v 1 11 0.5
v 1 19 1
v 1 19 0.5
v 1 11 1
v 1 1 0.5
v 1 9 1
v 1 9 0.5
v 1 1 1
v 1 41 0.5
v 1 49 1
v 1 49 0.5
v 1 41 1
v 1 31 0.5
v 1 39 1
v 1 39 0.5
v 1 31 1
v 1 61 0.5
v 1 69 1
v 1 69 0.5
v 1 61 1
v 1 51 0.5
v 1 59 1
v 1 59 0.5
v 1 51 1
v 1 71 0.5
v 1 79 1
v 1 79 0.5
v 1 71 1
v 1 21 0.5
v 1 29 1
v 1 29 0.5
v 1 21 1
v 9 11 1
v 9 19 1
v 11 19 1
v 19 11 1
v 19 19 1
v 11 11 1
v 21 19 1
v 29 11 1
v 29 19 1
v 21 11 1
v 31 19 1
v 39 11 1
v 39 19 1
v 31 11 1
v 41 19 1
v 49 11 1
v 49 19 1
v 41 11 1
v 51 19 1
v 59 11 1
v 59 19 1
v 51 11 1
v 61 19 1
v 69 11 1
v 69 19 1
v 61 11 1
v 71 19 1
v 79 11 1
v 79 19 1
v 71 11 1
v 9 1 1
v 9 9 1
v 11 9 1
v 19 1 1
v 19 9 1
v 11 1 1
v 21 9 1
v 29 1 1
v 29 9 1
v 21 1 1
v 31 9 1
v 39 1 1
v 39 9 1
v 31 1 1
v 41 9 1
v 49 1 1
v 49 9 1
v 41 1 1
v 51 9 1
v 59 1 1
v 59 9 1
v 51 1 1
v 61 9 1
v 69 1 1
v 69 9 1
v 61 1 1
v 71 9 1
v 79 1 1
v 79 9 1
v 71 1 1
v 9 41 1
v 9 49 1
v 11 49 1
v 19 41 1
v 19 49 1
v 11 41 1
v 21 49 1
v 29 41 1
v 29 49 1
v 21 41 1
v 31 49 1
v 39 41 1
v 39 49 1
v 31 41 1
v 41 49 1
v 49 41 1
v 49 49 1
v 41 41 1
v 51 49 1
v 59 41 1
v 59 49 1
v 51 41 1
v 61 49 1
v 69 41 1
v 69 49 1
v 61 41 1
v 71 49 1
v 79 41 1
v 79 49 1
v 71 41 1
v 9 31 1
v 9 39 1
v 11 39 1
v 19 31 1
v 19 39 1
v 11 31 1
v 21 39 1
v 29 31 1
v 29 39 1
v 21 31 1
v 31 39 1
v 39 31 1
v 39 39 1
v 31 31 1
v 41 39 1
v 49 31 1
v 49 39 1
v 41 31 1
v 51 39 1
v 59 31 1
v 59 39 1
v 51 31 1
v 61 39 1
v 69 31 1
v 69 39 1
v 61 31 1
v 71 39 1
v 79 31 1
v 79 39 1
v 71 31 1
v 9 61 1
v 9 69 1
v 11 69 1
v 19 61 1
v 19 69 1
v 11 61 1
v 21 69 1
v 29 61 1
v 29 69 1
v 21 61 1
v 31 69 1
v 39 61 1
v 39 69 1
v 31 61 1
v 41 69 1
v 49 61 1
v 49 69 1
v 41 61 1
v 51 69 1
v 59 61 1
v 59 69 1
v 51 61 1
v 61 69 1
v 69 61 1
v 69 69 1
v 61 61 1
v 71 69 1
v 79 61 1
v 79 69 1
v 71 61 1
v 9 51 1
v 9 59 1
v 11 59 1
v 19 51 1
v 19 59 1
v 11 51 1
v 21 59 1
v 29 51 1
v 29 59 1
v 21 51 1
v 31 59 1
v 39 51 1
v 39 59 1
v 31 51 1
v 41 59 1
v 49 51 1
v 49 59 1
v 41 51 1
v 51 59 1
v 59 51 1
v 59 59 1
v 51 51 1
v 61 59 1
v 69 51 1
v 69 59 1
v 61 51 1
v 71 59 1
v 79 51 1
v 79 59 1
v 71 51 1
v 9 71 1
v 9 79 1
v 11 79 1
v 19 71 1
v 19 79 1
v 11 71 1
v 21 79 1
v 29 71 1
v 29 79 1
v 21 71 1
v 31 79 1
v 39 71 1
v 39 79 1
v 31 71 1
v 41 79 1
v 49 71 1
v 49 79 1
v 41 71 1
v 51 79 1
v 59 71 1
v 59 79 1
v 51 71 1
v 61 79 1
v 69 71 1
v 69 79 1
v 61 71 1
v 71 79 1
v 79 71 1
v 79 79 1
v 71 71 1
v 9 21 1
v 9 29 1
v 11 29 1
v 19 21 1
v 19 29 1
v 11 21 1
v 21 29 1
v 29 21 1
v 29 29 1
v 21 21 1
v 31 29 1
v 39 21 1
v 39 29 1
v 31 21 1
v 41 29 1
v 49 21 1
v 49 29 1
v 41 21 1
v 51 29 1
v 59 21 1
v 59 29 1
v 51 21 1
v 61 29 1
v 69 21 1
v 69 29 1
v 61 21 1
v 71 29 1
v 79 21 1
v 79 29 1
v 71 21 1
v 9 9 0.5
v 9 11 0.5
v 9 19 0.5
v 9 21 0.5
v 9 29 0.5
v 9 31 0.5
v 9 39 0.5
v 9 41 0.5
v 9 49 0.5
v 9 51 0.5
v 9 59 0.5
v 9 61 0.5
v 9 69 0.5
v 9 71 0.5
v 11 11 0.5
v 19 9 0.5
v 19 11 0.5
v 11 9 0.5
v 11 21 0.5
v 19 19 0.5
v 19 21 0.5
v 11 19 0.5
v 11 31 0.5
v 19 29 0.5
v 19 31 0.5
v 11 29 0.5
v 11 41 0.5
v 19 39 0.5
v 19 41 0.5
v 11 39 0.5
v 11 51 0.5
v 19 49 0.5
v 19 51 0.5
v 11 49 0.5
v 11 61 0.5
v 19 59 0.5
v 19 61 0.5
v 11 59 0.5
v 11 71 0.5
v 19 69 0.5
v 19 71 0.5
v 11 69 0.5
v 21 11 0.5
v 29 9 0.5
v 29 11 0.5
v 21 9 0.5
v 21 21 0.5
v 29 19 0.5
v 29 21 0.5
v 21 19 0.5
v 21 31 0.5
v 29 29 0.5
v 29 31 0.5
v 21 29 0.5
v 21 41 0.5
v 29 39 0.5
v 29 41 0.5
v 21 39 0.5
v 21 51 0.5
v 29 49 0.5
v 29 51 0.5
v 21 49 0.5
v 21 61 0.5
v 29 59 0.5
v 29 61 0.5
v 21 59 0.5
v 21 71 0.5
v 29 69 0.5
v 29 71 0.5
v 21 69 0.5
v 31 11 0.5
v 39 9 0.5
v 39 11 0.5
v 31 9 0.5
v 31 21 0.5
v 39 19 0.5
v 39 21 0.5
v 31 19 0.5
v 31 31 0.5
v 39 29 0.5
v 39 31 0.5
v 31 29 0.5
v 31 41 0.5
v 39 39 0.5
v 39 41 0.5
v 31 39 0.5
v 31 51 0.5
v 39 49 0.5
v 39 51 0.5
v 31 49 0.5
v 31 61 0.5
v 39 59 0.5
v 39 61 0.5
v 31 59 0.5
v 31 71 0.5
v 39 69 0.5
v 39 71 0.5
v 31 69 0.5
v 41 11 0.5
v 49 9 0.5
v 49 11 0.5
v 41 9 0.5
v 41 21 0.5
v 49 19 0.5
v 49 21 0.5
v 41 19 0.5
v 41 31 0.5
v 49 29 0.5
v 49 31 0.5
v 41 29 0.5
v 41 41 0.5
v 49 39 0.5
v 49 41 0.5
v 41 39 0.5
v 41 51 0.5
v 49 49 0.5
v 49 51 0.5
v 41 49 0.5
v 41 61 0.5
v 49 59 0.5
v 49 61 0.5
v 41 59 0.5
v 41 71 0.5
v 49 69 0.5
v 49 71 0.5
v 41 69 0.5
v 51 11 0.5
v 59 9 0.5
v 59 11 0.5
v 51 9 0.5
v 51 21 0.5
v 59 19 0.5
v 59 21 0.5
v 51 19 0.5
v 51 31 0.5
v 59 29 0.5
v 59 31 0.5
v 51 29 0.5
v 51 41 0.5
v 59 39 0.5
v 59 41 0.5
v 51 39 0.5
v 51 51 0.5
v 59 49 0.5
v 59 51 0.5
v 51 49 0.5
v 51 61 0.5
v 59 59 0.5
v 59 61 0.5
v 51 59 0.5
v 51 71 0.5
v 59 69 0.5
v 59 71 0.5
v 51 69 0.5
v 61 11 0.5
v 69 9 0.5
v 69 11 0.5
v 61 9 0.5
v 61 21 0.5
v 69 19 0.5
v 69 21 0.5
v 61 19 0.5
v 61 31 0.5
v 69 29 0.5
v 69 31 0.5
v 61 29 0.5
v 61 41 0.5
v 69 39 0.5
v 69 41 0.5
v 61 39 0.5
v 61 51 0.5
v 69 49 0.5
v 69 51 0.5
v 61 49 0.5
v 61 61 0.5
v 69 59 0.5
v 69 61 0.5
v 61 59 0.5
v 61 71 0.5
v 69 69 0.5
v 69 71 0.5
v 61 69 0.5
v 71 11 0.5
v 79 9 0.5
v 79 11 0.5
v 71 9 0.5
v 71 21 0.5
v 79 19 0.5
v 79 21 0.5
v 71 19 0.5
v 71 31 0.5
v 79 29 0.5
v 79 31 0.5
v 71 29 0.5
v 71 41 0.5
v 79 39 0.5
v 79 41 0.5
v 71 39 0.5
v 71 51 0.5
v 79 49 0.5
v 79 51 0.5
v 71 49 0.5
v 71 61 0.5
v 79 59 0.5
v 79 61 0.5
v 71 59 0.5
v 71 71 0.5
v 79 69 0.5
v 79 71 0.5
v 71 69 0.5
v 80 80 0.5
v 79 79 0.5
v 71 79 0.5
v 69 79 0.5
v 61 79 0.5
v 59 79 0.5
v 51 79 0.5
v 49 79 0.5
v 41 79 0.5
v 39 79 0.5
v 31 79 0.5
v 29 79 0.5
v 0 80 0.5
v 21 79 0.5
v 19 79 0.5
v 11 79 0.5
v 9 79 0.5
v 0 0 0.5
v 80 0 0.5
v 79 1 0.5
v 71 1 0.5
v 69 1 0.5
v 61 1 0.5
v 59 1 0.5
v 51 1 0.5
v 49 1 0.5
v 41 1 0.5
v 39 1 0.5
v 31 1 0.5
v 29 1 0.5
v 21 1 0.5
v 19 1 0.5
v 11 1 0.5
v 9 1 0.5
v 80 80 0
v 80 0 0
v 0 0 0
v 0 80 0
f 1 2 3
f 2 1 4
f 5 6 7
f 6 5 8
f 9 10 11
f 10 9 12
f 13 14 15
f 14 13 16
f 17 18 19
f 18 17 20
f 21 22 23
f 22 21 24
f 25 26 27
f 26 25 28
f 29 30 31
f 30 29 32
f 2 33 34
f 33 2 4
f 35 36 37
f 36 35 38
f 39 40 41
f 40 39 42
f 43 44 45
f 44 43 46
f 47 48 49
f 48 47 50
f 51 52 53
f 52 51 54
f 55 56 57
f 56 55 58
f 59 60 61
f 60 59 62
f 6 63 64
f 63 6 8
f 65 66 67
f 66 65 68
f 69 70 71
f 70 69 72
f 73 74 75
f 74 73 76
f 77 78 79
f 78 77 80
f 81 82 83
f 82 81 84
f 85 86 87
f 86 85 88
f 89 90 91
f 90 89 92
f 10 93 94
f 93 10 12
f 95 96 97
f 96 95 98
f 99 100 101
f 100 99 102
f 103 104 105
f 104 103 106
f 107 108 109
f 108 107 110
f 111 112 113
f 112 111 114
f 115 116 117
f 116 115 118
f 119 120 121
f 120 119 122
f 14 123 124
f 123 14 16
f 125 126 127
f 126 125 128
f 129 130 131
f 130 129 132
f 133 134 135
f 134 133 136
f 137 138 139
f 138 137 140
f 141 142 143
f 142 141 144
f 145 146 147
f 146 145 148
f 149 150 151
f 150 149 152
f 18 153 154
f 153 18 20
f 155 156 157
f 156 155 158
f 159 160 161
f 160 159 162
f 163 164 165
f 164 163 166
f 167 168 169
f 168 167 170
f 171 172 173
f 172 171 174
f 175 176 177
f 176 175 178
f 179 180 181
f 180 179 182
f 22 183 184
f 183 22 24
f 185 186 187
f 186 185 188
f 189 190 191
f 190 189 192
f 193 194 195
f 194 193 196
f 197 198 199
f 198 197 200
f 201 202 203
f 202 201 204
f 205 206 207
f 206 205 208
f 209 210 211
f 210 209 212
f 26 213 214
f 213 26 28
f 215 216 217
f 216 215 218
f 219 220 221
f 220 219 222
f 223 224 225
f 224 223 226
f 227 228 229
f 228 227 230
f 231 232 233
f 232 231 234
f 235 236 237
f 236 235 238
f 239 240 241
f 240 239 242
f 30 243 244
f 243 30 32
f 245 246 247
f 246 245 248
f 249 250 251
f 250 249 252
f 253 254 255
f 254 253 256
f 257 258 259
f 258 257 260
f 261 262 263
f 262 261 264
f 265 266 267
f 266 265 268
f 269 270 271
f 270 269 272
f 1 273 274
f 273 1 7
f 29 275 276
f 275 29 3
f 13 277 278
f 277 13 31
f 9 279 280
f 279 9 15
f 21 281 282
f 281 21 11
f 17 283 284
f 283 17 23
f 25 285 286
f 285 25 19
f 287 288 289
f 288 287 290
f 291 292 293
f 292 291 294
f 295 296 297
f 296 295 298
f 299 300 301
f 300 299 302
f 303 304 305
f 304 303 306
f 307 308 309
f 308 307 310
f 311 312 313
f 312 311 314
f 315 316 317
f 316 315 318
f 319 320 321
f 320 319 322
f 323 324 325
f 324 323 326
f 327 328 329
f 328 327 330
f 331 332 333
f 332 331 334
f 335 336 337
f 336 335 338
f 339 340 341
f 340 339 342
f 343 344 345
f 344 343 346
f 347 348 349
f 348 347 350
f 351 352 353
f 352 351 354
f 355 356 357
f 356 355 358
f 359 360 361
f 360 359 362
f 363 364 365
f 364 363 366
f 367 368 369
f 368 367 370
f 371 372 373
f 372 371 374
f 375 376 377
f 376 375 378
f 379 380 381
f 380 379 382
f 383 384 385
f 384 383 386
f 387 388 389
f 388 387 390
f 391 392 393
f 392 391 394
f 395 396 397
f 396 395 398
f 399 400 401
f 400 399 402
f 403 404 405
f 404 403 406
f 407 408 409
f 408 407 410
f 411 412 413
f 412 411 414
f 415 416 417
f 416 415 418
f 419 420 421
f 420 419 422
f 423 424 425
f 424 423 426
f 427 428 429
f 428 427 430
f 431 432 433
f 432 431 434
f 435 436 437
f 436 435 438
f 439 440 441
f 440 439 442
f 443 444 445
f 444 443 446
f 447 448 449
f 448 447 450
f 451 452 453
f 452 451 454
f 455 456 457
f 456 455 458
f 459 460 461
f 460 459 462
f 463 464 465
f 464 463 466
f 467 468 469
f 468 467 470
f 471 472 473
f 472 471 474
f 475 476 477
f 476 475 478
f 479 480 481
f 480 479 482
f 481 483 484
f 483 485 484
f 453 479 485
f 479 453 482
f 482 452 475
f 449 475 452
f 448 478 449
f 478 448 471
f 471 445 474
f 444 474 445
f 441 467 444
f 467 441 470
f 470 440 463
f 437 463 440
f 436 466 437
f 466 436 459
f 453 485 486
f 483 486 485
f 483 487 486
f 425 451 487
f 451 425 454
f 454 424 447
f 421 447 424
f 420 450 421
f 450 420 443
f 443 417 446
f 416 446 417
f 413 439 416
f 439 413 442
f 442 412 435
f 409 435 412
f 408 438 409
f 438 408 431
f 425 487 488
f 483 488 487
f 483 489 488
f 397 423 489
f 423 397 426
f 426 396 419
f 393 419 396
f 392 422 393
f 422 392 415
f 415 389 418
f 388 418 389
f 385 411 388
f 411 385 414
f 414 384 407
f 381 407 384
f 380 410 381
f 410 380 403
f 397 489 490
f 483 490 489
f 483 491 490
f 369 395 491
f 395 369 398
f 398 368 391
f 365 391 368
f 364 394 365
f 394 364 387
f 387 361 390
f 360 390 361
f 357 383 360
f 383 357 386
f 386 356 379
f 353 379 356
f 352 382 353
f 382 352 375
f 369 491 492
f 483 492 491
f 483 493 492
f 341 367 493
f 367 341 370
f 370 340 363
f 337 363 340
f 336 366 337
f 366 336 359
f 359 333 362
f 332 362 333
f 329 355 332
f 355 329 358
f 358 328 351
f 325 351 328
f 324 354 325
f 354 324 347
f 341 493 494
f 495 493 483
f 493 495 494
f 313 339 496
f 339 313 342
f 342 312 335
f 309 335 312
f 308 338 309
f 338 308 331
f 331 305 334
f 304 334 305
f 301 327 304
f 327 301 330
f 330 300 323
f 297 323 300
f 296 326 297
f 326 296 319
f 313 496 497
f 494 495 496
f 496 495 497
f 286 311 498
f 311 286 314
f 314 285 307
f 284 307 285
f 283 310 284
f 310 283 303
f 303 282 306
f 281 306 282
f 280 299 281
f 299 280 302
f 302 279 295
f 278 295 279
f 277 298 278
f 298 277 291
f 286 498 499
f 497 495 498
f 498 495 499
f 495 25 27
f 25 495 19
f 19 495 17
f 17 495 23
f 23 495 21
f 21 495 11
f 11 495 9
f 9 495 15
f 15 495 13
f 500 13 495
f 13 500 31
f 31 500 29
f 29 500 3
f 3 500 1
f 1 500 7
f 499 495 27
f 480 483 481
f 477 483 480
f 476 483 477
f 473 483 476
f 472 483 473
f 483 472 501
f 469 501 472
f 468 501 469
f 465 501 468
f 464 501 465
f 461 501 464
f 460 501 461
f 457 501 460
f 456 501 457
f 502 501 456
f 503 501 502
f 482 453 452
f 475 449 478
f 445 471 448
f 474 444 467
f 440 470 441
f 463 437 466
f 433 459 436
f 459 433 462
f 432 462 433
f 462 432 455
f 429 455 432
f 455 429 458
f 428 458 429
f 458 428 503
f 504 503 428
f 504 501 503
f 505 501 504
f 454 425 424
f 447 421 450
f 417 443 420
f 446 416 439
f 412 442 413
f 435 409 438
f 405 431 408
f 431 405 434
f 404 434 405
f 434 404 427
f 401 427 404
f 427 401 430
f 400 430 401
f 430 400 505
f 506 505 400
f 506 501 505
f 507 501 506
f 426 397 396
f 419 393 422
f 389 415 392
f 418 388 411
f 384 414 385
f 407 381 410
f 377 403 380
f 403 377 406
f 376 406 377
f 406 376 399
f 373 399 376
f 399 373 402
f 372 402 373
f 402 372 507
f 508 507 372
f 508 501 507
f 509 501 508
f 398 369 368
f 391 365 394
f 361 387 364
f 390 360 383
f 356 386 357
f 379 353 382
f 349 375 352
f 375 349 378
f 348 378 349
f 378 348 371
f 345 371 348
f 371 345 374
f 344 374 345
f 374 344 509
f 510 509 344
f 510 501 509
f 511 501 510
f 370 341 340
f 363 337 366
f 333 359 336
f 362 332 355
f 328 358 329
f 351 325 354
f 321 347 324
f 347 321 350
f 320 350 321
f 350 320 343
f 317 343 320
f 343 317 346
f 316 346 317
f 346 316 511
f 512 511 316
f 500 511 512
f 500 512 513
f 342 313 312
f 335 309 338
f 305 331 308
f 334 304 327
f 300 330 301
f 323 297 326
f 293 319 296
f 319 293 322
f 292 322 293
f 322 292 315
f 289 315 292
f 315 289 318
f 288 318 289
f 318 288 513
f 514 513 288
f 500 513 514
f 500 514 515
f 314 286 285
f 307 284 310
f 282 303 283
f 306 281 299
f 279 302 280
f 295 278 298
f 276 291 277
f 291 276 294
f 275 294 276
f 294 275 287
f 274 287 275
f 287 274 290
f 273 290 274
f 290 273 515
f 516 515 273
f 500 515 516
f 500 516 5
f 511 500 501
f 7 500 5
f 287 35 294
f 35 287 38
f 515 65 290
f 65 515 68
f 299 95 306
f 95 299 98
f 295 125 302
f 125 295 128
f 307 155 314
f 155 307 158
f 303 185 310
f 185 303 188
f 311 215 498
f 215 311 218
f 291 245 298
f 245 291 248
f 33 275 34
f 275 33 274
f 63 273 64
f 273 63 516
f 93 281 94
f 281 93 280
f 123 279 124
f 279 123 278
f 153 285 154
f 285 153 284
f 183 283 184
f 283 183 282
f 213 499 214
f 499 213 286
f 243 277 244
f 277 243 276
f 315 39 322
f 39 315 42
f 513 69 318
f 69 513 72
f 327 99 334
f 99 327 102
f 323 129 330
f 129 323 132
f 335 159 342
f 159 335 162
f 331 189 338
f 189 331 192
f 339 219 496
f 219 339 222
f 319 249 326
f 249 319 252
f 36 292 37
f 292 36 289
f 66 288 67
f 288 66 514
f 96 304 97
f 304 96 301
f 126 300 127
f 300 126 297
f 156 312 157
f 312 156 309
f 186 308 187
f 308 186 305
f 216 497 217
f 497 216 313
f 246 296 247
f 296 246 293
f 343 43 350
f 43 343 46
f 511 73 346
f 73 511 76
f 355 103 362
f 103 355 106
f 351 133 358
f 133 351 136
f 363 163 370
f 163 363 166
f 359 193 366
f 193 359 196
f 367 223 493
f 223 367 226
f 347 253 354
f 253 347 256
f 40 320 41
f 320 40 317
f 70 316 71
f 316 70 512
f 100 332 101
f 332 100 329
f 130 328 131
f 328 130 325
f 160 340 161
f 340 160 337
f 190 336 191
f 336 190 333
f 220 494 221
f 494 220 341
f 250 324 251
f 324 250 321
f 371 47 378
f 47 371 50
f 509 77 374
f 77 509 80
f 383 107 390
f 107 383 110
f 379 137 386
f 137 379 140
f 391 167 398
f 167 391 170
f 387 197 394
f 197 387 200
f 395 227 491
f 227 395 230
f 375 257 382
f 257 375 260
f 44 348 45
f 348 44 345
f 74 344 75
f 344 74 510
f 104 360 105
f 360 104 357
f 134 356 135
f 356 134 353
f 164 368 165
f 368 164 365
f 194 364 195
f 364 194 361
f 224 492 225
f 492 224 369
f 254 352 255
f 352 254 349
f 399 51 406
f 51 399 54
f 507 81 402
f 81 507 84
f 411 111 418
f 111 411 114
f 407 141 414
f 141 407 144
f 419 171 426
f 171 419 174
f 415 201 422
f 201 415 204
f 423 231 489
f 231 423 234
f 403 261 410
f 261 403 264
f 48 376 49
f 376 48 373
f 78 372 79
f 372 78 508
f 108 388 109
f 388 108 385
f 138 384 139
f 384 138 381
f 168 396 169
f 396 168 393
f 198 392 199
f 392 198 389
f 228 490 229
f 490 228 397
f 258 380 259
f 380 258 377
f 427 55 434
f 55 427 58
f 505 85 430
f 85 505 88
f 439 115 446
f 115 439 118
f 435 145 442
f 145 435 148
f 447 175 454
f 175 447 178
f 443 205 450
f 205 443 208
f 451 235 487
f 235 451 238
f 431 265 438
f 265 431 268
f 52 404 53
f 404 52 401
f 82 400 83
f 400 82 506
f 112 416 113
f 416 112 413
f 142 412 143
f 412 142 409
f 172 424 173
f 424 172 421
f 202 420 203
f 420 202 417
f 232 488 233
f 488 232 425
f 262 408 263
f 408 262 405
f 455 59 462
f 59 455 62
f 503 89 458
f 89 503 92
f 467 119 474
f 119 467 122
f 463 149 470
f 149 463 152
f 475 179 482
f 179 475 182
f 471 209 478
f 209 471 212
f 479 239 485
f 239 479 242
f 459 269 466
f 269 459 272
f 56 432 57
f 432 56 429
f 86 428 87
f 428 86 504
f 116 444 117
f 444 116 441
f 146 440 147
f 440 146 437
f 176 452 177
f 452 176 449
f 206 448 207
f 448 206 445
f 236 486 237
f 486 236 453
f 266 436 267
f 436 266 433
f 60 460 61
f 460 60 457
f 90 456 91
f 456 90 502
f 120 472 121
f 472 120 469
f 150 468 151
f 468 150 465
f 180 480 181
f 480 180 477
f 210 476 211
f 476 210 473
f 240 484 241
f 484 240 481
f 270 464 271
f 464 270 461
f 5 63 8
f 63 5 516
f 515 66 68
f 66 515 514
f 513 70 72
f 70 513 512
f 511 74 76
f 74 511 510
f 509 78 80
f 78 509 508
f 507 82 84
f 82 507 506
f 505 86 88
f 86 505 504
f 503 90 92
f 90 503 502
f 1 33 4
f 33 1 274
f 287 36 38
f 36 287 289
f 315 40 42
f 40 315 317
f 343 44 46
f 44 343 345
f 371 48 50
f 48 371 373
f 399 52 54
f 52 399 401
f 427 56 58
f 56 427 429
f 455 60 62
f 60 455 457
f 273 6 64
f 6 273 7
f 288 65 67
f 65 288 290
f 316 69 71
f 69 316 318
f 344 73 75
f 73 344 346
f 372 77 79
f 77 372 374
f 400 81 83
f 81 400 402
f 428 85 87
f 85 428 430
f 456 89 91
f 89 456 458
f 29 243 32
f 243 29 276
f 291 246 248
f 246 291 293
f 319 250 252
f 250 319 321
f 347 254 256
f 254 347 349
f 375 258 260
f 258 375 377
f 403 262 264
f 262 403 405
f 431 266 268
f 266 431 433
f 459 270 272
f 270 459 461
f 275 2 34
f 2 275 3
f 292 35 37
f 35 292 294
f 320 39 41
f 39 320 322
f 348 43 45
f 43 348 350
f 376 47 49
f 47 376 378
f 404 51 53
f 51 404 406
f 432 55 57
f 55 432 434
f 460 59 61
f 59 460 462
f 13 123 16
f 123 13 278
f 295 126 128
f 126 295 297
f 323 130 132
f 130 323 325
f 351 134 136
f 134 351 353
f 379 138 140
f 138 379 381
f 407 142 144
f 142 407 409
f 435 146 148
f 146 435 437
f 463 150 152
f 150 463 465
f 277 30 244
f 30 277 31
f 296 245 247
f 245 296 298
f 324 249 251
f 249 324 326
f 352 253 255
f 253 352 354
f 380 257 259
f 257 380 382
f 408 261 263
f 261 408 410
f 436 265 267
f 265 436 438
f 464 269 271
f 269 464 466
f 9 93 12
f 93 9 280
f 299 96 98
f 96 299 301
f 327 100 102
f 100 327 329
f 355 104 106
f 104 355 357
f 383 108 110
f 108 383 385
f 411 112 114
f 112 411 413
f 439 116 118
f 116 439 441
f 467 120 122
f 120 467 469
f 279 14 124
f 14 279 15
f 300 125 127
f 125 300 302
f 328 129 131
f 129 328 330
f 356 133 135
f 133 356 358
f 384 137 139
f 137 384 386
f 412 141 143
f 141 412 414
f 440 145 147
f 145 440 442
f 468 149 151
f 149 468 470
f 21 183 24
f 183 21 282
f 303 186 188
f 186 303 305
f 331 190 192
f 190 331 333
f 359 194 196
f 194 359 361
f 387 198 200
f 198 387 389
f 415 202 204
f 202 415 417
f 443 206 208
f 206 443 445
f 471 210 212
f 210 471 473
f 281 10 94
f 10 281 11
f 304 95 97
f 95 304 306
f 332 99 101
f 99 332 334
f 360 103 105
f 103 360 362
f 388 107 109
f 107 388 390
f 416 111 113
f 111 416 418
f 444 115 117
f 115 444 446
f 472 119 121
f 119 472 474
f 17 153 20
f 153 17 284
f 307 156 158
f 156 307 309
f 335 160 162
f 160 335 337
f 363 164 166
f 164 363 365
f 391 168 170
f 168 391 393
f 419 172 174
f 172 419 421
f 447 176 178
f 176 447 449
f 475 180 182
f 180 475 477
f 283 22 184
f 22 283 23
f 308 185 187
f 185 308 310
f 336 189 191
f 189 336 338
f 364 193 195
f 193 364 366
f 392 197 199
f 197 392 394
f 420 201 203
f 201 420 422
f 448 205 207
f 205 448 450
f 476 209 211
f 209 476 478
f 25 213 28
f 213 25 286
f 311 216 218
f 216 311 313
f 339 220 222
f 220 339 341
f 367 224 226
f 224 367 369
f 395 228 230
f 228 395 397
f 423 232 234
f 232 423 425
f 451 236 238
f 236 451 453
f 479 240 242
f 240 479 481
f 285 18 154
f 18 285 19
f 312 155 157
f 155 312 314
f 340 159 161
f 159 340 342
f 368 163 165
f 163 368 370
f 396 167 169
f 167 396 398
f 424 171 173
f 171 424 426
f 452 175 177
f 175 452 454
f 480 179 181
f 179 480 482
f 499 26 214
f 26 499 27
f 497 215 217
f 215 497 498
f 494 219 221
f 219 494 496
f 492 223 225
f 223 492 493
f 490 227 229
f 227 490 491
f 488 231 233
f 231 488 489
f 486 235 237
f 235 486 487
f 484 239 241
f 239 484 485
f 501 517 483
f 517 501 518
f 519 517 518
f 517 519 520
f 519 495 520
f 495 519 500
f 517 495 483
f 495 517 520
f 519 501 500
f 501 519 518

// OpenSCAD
// ========================
// Parameters
// ========================

// Grid
grid_height = 0.5;

// increase for smoother cone ($fn)
segments = 64;

// smooth corners
$fn = segments;  

module grid(cells = [8.5, 8.5], spacing = 1.5, wall = 2, height = grid_height) {
    rows = 8;
    cols = 8;

    // Vertical walls
    for (i = [0:cols]) {
        translate([
            i * (cells[0] + spacing) - spacing/2 - wall/2,
            -wall,
            0
        ])
            cube([wall, rows * (cells[1] + spacing)+wall, height]);
    }

    // Horizontal walls
    for (j = [0:rows]) {
        translate([
            -wall,
            j * (cells[1] + spacing) - spacing/2 - wall/2,
            0
        ])
            cube([cols * (cells[0] + spacing)+wall, wall, height]);
    }
}

// ========================
// Top case
// ========================

difference() {
    translate([0, 0, 0])
        cube([80, 80, 1]);
    translate([0.75, 0.75, 0.5])
        grid();
}
